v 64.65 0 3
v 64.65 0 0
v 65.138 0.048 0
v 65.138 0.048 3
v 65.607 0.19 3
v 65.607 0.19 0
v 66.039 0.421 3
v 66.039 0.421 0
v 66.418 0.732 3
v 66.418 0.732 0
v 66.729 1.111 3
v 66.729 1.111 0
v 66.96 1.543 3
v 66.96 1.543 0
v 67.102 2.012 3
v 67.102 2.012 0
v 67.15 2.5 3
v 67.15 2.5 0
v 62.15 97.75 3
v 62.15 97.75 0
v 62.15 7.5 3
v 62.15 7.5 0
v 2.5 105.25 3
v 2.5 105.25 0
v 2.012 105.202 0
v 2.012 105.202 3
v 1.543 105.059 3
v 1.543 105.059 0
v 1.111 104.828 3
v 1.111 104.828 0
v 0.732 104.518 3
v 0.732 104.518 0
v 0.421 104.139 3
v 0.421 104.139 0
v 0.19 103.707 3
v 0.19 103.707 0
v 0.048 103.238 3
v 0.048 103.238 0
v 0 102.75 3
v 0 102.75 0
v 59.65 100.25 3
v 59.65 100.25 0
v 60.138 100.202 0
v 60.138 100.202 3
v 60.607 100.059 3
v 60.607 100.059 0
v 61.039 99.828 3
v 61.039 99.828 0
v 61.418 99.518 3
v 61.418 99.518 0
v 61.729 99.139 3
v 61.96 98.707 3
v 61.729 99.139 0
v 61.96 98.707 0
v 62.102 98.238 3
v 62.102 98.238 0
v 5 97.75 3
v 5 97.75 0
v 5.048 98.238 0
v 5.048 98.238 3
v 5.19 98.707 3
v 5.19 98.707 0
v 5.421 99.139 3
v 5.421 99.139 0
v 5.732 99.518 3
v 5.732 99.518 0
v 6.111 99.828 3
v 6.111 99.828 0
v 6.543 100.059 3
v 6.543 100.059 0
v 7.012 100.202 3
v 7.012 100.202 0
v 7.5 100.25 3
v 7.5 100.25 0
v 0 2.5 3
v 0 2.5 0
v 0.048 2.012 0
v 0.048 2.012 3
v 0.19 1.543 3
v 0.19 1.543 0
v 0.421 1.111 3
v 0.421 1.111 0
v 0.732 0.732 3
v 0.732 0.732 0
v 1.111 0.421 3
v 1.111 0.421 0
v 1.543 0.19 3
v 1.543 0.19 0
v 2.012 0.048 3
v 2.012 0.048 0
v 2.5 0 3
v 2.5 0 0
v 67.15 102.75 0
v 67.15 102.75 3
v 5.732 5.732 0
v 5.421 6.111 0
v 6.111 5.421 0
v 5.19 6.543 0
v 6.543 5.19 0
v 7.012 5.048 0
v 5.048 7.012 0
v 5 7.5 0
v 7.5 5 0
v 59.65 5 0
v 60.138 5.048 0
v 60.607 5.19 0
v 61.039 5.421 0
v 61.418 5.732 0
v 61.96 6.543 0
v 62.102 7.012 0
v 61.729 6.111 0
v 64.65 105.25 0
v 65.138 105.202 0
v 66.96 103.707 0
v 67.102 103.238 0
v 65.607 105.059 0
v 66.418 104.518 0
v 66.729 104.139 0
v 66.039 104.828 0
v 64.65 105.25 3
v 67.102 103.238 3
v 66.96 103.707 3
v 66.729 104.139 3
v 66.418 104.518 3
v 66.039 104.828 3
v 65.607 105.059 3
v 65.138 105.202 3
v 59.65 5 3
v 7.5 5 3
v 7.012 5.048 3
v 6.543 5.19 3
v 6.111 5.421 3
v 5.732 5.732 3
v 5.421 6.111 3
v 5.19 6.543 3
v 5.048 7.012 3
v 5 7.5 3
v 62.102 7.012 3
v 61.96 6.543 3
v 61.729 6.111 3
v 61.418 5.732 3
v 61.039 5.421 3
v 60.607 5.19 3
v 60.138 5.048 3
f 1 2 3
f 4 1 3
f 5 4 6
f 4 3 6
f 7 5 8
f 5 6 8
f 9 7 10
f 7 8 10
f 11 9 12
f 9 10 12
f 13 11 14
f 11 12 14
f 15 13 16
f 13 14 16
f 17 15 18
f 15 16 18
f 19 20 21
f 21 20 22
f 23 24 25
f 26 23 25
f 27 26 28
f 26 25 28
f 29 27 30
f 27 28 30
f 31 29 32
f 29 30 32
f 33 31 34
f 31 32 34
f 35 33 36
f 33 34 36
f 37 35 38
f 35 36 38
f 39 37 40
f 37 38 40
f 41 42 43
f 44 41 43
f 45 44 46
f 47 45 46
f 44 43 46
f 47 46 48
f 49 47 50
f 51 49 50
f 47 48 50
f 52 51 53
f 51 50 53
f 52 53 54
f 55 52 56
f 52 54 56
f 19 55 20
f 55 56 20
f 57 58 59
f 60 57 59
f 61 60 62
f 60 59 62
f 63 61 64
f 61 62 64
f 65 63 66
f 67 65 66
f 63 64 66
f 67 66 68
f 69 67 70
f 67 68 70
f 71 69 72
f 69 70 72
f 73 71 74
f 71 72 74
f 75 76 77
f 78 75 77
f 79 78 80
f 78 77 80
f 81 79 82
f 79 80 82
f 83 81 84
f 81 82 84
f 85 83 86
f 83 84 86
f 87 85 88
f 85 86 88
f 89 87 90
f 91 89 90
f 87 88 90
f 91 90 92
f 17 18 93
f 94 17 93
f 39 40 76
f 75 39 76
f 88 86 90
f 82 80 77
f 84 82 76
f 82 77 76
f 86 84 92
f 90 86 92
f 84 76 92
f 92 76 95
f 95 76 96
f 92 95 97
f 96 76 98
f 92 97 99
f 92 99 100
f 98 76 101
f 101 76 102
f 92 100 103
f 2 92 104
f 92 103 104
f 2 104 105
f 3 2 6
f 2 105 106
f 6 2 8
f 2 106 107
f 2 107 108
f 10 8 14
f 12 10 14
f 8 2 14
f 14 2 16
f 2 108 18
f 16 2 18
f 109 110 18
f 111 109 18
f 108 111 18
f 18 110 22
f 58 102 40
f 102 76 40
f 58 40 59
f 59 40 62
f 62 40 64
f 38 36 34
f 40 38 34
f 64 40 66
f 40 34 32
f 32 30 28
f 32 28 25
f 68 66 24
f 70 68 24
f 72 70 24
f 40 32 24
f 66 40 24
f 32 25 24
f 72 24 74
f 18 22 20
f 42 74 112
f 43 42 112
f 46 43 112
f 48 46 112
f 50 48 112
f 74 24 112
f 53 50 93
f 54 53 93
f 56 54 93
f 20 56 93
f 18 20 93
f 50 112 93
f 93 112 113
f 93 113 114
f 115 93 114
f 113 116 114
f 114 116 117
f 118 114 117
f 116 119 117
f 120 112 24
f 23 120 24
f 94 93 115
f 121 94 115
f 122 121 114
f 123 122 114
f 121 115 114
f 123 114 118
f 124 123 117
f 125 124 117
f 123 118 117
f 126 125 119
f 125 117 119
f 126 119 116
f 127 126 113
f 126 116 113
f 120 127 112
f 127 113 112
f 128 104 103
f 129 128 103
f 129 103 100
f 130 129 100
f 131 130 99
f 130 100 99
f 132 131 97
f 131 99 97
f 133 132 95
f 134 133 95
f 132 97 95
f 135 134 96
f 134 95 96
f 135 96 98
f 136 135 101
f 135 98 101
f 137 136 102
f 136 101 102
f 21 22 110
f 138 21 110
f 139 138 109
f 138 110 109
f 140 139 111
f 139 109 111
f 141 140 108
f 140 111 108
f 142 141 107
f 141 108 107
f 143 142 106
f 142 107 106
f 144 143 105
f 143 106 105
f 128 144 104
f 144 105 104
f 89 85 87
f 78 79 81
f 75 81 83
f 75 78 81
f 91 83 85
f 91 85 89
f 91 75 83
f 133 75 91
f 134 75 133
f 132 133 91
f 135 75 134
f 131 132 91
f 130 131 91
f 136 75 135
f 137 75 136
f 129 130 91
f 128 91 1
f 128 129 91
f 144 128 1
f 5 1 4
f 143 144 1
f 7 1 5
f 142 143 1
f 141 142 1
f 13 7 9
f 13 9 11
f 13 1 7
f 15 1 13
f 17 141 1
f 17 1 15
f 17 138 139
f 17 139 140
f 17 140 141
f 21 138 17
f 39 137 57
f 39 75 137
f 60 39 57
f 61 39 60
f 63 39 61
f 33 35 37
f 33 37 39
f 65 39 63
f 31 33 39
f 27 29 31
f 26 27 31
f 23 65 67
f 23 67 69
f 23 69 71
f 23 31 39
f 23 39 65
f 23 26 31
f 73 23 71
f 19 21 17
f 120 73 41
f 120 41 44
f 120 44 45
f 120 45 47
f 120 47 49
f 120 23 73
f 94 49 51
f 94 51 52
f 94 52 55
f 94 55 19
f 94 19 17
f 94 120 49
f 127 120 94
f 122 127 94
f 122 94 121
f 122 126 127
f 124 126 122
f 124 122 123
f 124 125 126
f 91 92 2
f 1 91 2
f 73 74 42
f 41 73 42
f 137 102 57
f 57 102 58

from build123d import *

# Parameters (mm, degrees)
EXTRUDE_1_DEPTH = 3


with BuildPart() as part:
    # 草图1 → 凸台-拉伸1 (new body)
    with BuildSketch(Plane.XY):
        with BuildLine():
            Line((2.5, 0), (64.6502, 0))
            ThreePointArc((64.6502, 0), (66.417966953, 0.732233047), (67.1502, 2.5))
            Line((67.1502, 2.5), (67.1502, 102.7498))
            ThreePointArc((67.1502, 102.7498), (66.417966953, 104.517566953), (64.6502, 105.2498))
            Line((64.6502, 105.2498), (2.5, 105.2498))
            ThreePointArc((2.5, 105.2498), (0.732233047, 104.517566953), (0, 102.7498))
            Line((0, 102.7498), (0, 2.5))
            ThreePointArc((0, 2.5), (0.732233047, 0.732233047), (2.5, 0))
        make_face()
        with BuildLine():
            Line((7.5, 100.2498), (59.6502, 100.2498))
            ThreePointArc((59.6502, 100.2498), (61.417966953, 99.517566953), (62.1502, 97.7498))
            Line((62.1502, 97.7498), (62.1502, 7.5))
            ThreePointArc((62.1502, 7.5), (61.417966953, 5.732233047), (59.6502, 5))
            Line((59.6502, 5), (7.5, 5))
            ThreePointArc((7.5, 5), (5.732233047, 5.732233047), (5, 7.5))
            Line((5, 7.5), (5, 97.7498))
            ThreePointArc((5, 97.7498), (5.732233047, 99.517566953), (7.5, 100.2498))
        make_face(mode=Mode.SUBTRACT)
    extrude(amount=EXTRUDE_1_DEPTH)


solid = part.part
